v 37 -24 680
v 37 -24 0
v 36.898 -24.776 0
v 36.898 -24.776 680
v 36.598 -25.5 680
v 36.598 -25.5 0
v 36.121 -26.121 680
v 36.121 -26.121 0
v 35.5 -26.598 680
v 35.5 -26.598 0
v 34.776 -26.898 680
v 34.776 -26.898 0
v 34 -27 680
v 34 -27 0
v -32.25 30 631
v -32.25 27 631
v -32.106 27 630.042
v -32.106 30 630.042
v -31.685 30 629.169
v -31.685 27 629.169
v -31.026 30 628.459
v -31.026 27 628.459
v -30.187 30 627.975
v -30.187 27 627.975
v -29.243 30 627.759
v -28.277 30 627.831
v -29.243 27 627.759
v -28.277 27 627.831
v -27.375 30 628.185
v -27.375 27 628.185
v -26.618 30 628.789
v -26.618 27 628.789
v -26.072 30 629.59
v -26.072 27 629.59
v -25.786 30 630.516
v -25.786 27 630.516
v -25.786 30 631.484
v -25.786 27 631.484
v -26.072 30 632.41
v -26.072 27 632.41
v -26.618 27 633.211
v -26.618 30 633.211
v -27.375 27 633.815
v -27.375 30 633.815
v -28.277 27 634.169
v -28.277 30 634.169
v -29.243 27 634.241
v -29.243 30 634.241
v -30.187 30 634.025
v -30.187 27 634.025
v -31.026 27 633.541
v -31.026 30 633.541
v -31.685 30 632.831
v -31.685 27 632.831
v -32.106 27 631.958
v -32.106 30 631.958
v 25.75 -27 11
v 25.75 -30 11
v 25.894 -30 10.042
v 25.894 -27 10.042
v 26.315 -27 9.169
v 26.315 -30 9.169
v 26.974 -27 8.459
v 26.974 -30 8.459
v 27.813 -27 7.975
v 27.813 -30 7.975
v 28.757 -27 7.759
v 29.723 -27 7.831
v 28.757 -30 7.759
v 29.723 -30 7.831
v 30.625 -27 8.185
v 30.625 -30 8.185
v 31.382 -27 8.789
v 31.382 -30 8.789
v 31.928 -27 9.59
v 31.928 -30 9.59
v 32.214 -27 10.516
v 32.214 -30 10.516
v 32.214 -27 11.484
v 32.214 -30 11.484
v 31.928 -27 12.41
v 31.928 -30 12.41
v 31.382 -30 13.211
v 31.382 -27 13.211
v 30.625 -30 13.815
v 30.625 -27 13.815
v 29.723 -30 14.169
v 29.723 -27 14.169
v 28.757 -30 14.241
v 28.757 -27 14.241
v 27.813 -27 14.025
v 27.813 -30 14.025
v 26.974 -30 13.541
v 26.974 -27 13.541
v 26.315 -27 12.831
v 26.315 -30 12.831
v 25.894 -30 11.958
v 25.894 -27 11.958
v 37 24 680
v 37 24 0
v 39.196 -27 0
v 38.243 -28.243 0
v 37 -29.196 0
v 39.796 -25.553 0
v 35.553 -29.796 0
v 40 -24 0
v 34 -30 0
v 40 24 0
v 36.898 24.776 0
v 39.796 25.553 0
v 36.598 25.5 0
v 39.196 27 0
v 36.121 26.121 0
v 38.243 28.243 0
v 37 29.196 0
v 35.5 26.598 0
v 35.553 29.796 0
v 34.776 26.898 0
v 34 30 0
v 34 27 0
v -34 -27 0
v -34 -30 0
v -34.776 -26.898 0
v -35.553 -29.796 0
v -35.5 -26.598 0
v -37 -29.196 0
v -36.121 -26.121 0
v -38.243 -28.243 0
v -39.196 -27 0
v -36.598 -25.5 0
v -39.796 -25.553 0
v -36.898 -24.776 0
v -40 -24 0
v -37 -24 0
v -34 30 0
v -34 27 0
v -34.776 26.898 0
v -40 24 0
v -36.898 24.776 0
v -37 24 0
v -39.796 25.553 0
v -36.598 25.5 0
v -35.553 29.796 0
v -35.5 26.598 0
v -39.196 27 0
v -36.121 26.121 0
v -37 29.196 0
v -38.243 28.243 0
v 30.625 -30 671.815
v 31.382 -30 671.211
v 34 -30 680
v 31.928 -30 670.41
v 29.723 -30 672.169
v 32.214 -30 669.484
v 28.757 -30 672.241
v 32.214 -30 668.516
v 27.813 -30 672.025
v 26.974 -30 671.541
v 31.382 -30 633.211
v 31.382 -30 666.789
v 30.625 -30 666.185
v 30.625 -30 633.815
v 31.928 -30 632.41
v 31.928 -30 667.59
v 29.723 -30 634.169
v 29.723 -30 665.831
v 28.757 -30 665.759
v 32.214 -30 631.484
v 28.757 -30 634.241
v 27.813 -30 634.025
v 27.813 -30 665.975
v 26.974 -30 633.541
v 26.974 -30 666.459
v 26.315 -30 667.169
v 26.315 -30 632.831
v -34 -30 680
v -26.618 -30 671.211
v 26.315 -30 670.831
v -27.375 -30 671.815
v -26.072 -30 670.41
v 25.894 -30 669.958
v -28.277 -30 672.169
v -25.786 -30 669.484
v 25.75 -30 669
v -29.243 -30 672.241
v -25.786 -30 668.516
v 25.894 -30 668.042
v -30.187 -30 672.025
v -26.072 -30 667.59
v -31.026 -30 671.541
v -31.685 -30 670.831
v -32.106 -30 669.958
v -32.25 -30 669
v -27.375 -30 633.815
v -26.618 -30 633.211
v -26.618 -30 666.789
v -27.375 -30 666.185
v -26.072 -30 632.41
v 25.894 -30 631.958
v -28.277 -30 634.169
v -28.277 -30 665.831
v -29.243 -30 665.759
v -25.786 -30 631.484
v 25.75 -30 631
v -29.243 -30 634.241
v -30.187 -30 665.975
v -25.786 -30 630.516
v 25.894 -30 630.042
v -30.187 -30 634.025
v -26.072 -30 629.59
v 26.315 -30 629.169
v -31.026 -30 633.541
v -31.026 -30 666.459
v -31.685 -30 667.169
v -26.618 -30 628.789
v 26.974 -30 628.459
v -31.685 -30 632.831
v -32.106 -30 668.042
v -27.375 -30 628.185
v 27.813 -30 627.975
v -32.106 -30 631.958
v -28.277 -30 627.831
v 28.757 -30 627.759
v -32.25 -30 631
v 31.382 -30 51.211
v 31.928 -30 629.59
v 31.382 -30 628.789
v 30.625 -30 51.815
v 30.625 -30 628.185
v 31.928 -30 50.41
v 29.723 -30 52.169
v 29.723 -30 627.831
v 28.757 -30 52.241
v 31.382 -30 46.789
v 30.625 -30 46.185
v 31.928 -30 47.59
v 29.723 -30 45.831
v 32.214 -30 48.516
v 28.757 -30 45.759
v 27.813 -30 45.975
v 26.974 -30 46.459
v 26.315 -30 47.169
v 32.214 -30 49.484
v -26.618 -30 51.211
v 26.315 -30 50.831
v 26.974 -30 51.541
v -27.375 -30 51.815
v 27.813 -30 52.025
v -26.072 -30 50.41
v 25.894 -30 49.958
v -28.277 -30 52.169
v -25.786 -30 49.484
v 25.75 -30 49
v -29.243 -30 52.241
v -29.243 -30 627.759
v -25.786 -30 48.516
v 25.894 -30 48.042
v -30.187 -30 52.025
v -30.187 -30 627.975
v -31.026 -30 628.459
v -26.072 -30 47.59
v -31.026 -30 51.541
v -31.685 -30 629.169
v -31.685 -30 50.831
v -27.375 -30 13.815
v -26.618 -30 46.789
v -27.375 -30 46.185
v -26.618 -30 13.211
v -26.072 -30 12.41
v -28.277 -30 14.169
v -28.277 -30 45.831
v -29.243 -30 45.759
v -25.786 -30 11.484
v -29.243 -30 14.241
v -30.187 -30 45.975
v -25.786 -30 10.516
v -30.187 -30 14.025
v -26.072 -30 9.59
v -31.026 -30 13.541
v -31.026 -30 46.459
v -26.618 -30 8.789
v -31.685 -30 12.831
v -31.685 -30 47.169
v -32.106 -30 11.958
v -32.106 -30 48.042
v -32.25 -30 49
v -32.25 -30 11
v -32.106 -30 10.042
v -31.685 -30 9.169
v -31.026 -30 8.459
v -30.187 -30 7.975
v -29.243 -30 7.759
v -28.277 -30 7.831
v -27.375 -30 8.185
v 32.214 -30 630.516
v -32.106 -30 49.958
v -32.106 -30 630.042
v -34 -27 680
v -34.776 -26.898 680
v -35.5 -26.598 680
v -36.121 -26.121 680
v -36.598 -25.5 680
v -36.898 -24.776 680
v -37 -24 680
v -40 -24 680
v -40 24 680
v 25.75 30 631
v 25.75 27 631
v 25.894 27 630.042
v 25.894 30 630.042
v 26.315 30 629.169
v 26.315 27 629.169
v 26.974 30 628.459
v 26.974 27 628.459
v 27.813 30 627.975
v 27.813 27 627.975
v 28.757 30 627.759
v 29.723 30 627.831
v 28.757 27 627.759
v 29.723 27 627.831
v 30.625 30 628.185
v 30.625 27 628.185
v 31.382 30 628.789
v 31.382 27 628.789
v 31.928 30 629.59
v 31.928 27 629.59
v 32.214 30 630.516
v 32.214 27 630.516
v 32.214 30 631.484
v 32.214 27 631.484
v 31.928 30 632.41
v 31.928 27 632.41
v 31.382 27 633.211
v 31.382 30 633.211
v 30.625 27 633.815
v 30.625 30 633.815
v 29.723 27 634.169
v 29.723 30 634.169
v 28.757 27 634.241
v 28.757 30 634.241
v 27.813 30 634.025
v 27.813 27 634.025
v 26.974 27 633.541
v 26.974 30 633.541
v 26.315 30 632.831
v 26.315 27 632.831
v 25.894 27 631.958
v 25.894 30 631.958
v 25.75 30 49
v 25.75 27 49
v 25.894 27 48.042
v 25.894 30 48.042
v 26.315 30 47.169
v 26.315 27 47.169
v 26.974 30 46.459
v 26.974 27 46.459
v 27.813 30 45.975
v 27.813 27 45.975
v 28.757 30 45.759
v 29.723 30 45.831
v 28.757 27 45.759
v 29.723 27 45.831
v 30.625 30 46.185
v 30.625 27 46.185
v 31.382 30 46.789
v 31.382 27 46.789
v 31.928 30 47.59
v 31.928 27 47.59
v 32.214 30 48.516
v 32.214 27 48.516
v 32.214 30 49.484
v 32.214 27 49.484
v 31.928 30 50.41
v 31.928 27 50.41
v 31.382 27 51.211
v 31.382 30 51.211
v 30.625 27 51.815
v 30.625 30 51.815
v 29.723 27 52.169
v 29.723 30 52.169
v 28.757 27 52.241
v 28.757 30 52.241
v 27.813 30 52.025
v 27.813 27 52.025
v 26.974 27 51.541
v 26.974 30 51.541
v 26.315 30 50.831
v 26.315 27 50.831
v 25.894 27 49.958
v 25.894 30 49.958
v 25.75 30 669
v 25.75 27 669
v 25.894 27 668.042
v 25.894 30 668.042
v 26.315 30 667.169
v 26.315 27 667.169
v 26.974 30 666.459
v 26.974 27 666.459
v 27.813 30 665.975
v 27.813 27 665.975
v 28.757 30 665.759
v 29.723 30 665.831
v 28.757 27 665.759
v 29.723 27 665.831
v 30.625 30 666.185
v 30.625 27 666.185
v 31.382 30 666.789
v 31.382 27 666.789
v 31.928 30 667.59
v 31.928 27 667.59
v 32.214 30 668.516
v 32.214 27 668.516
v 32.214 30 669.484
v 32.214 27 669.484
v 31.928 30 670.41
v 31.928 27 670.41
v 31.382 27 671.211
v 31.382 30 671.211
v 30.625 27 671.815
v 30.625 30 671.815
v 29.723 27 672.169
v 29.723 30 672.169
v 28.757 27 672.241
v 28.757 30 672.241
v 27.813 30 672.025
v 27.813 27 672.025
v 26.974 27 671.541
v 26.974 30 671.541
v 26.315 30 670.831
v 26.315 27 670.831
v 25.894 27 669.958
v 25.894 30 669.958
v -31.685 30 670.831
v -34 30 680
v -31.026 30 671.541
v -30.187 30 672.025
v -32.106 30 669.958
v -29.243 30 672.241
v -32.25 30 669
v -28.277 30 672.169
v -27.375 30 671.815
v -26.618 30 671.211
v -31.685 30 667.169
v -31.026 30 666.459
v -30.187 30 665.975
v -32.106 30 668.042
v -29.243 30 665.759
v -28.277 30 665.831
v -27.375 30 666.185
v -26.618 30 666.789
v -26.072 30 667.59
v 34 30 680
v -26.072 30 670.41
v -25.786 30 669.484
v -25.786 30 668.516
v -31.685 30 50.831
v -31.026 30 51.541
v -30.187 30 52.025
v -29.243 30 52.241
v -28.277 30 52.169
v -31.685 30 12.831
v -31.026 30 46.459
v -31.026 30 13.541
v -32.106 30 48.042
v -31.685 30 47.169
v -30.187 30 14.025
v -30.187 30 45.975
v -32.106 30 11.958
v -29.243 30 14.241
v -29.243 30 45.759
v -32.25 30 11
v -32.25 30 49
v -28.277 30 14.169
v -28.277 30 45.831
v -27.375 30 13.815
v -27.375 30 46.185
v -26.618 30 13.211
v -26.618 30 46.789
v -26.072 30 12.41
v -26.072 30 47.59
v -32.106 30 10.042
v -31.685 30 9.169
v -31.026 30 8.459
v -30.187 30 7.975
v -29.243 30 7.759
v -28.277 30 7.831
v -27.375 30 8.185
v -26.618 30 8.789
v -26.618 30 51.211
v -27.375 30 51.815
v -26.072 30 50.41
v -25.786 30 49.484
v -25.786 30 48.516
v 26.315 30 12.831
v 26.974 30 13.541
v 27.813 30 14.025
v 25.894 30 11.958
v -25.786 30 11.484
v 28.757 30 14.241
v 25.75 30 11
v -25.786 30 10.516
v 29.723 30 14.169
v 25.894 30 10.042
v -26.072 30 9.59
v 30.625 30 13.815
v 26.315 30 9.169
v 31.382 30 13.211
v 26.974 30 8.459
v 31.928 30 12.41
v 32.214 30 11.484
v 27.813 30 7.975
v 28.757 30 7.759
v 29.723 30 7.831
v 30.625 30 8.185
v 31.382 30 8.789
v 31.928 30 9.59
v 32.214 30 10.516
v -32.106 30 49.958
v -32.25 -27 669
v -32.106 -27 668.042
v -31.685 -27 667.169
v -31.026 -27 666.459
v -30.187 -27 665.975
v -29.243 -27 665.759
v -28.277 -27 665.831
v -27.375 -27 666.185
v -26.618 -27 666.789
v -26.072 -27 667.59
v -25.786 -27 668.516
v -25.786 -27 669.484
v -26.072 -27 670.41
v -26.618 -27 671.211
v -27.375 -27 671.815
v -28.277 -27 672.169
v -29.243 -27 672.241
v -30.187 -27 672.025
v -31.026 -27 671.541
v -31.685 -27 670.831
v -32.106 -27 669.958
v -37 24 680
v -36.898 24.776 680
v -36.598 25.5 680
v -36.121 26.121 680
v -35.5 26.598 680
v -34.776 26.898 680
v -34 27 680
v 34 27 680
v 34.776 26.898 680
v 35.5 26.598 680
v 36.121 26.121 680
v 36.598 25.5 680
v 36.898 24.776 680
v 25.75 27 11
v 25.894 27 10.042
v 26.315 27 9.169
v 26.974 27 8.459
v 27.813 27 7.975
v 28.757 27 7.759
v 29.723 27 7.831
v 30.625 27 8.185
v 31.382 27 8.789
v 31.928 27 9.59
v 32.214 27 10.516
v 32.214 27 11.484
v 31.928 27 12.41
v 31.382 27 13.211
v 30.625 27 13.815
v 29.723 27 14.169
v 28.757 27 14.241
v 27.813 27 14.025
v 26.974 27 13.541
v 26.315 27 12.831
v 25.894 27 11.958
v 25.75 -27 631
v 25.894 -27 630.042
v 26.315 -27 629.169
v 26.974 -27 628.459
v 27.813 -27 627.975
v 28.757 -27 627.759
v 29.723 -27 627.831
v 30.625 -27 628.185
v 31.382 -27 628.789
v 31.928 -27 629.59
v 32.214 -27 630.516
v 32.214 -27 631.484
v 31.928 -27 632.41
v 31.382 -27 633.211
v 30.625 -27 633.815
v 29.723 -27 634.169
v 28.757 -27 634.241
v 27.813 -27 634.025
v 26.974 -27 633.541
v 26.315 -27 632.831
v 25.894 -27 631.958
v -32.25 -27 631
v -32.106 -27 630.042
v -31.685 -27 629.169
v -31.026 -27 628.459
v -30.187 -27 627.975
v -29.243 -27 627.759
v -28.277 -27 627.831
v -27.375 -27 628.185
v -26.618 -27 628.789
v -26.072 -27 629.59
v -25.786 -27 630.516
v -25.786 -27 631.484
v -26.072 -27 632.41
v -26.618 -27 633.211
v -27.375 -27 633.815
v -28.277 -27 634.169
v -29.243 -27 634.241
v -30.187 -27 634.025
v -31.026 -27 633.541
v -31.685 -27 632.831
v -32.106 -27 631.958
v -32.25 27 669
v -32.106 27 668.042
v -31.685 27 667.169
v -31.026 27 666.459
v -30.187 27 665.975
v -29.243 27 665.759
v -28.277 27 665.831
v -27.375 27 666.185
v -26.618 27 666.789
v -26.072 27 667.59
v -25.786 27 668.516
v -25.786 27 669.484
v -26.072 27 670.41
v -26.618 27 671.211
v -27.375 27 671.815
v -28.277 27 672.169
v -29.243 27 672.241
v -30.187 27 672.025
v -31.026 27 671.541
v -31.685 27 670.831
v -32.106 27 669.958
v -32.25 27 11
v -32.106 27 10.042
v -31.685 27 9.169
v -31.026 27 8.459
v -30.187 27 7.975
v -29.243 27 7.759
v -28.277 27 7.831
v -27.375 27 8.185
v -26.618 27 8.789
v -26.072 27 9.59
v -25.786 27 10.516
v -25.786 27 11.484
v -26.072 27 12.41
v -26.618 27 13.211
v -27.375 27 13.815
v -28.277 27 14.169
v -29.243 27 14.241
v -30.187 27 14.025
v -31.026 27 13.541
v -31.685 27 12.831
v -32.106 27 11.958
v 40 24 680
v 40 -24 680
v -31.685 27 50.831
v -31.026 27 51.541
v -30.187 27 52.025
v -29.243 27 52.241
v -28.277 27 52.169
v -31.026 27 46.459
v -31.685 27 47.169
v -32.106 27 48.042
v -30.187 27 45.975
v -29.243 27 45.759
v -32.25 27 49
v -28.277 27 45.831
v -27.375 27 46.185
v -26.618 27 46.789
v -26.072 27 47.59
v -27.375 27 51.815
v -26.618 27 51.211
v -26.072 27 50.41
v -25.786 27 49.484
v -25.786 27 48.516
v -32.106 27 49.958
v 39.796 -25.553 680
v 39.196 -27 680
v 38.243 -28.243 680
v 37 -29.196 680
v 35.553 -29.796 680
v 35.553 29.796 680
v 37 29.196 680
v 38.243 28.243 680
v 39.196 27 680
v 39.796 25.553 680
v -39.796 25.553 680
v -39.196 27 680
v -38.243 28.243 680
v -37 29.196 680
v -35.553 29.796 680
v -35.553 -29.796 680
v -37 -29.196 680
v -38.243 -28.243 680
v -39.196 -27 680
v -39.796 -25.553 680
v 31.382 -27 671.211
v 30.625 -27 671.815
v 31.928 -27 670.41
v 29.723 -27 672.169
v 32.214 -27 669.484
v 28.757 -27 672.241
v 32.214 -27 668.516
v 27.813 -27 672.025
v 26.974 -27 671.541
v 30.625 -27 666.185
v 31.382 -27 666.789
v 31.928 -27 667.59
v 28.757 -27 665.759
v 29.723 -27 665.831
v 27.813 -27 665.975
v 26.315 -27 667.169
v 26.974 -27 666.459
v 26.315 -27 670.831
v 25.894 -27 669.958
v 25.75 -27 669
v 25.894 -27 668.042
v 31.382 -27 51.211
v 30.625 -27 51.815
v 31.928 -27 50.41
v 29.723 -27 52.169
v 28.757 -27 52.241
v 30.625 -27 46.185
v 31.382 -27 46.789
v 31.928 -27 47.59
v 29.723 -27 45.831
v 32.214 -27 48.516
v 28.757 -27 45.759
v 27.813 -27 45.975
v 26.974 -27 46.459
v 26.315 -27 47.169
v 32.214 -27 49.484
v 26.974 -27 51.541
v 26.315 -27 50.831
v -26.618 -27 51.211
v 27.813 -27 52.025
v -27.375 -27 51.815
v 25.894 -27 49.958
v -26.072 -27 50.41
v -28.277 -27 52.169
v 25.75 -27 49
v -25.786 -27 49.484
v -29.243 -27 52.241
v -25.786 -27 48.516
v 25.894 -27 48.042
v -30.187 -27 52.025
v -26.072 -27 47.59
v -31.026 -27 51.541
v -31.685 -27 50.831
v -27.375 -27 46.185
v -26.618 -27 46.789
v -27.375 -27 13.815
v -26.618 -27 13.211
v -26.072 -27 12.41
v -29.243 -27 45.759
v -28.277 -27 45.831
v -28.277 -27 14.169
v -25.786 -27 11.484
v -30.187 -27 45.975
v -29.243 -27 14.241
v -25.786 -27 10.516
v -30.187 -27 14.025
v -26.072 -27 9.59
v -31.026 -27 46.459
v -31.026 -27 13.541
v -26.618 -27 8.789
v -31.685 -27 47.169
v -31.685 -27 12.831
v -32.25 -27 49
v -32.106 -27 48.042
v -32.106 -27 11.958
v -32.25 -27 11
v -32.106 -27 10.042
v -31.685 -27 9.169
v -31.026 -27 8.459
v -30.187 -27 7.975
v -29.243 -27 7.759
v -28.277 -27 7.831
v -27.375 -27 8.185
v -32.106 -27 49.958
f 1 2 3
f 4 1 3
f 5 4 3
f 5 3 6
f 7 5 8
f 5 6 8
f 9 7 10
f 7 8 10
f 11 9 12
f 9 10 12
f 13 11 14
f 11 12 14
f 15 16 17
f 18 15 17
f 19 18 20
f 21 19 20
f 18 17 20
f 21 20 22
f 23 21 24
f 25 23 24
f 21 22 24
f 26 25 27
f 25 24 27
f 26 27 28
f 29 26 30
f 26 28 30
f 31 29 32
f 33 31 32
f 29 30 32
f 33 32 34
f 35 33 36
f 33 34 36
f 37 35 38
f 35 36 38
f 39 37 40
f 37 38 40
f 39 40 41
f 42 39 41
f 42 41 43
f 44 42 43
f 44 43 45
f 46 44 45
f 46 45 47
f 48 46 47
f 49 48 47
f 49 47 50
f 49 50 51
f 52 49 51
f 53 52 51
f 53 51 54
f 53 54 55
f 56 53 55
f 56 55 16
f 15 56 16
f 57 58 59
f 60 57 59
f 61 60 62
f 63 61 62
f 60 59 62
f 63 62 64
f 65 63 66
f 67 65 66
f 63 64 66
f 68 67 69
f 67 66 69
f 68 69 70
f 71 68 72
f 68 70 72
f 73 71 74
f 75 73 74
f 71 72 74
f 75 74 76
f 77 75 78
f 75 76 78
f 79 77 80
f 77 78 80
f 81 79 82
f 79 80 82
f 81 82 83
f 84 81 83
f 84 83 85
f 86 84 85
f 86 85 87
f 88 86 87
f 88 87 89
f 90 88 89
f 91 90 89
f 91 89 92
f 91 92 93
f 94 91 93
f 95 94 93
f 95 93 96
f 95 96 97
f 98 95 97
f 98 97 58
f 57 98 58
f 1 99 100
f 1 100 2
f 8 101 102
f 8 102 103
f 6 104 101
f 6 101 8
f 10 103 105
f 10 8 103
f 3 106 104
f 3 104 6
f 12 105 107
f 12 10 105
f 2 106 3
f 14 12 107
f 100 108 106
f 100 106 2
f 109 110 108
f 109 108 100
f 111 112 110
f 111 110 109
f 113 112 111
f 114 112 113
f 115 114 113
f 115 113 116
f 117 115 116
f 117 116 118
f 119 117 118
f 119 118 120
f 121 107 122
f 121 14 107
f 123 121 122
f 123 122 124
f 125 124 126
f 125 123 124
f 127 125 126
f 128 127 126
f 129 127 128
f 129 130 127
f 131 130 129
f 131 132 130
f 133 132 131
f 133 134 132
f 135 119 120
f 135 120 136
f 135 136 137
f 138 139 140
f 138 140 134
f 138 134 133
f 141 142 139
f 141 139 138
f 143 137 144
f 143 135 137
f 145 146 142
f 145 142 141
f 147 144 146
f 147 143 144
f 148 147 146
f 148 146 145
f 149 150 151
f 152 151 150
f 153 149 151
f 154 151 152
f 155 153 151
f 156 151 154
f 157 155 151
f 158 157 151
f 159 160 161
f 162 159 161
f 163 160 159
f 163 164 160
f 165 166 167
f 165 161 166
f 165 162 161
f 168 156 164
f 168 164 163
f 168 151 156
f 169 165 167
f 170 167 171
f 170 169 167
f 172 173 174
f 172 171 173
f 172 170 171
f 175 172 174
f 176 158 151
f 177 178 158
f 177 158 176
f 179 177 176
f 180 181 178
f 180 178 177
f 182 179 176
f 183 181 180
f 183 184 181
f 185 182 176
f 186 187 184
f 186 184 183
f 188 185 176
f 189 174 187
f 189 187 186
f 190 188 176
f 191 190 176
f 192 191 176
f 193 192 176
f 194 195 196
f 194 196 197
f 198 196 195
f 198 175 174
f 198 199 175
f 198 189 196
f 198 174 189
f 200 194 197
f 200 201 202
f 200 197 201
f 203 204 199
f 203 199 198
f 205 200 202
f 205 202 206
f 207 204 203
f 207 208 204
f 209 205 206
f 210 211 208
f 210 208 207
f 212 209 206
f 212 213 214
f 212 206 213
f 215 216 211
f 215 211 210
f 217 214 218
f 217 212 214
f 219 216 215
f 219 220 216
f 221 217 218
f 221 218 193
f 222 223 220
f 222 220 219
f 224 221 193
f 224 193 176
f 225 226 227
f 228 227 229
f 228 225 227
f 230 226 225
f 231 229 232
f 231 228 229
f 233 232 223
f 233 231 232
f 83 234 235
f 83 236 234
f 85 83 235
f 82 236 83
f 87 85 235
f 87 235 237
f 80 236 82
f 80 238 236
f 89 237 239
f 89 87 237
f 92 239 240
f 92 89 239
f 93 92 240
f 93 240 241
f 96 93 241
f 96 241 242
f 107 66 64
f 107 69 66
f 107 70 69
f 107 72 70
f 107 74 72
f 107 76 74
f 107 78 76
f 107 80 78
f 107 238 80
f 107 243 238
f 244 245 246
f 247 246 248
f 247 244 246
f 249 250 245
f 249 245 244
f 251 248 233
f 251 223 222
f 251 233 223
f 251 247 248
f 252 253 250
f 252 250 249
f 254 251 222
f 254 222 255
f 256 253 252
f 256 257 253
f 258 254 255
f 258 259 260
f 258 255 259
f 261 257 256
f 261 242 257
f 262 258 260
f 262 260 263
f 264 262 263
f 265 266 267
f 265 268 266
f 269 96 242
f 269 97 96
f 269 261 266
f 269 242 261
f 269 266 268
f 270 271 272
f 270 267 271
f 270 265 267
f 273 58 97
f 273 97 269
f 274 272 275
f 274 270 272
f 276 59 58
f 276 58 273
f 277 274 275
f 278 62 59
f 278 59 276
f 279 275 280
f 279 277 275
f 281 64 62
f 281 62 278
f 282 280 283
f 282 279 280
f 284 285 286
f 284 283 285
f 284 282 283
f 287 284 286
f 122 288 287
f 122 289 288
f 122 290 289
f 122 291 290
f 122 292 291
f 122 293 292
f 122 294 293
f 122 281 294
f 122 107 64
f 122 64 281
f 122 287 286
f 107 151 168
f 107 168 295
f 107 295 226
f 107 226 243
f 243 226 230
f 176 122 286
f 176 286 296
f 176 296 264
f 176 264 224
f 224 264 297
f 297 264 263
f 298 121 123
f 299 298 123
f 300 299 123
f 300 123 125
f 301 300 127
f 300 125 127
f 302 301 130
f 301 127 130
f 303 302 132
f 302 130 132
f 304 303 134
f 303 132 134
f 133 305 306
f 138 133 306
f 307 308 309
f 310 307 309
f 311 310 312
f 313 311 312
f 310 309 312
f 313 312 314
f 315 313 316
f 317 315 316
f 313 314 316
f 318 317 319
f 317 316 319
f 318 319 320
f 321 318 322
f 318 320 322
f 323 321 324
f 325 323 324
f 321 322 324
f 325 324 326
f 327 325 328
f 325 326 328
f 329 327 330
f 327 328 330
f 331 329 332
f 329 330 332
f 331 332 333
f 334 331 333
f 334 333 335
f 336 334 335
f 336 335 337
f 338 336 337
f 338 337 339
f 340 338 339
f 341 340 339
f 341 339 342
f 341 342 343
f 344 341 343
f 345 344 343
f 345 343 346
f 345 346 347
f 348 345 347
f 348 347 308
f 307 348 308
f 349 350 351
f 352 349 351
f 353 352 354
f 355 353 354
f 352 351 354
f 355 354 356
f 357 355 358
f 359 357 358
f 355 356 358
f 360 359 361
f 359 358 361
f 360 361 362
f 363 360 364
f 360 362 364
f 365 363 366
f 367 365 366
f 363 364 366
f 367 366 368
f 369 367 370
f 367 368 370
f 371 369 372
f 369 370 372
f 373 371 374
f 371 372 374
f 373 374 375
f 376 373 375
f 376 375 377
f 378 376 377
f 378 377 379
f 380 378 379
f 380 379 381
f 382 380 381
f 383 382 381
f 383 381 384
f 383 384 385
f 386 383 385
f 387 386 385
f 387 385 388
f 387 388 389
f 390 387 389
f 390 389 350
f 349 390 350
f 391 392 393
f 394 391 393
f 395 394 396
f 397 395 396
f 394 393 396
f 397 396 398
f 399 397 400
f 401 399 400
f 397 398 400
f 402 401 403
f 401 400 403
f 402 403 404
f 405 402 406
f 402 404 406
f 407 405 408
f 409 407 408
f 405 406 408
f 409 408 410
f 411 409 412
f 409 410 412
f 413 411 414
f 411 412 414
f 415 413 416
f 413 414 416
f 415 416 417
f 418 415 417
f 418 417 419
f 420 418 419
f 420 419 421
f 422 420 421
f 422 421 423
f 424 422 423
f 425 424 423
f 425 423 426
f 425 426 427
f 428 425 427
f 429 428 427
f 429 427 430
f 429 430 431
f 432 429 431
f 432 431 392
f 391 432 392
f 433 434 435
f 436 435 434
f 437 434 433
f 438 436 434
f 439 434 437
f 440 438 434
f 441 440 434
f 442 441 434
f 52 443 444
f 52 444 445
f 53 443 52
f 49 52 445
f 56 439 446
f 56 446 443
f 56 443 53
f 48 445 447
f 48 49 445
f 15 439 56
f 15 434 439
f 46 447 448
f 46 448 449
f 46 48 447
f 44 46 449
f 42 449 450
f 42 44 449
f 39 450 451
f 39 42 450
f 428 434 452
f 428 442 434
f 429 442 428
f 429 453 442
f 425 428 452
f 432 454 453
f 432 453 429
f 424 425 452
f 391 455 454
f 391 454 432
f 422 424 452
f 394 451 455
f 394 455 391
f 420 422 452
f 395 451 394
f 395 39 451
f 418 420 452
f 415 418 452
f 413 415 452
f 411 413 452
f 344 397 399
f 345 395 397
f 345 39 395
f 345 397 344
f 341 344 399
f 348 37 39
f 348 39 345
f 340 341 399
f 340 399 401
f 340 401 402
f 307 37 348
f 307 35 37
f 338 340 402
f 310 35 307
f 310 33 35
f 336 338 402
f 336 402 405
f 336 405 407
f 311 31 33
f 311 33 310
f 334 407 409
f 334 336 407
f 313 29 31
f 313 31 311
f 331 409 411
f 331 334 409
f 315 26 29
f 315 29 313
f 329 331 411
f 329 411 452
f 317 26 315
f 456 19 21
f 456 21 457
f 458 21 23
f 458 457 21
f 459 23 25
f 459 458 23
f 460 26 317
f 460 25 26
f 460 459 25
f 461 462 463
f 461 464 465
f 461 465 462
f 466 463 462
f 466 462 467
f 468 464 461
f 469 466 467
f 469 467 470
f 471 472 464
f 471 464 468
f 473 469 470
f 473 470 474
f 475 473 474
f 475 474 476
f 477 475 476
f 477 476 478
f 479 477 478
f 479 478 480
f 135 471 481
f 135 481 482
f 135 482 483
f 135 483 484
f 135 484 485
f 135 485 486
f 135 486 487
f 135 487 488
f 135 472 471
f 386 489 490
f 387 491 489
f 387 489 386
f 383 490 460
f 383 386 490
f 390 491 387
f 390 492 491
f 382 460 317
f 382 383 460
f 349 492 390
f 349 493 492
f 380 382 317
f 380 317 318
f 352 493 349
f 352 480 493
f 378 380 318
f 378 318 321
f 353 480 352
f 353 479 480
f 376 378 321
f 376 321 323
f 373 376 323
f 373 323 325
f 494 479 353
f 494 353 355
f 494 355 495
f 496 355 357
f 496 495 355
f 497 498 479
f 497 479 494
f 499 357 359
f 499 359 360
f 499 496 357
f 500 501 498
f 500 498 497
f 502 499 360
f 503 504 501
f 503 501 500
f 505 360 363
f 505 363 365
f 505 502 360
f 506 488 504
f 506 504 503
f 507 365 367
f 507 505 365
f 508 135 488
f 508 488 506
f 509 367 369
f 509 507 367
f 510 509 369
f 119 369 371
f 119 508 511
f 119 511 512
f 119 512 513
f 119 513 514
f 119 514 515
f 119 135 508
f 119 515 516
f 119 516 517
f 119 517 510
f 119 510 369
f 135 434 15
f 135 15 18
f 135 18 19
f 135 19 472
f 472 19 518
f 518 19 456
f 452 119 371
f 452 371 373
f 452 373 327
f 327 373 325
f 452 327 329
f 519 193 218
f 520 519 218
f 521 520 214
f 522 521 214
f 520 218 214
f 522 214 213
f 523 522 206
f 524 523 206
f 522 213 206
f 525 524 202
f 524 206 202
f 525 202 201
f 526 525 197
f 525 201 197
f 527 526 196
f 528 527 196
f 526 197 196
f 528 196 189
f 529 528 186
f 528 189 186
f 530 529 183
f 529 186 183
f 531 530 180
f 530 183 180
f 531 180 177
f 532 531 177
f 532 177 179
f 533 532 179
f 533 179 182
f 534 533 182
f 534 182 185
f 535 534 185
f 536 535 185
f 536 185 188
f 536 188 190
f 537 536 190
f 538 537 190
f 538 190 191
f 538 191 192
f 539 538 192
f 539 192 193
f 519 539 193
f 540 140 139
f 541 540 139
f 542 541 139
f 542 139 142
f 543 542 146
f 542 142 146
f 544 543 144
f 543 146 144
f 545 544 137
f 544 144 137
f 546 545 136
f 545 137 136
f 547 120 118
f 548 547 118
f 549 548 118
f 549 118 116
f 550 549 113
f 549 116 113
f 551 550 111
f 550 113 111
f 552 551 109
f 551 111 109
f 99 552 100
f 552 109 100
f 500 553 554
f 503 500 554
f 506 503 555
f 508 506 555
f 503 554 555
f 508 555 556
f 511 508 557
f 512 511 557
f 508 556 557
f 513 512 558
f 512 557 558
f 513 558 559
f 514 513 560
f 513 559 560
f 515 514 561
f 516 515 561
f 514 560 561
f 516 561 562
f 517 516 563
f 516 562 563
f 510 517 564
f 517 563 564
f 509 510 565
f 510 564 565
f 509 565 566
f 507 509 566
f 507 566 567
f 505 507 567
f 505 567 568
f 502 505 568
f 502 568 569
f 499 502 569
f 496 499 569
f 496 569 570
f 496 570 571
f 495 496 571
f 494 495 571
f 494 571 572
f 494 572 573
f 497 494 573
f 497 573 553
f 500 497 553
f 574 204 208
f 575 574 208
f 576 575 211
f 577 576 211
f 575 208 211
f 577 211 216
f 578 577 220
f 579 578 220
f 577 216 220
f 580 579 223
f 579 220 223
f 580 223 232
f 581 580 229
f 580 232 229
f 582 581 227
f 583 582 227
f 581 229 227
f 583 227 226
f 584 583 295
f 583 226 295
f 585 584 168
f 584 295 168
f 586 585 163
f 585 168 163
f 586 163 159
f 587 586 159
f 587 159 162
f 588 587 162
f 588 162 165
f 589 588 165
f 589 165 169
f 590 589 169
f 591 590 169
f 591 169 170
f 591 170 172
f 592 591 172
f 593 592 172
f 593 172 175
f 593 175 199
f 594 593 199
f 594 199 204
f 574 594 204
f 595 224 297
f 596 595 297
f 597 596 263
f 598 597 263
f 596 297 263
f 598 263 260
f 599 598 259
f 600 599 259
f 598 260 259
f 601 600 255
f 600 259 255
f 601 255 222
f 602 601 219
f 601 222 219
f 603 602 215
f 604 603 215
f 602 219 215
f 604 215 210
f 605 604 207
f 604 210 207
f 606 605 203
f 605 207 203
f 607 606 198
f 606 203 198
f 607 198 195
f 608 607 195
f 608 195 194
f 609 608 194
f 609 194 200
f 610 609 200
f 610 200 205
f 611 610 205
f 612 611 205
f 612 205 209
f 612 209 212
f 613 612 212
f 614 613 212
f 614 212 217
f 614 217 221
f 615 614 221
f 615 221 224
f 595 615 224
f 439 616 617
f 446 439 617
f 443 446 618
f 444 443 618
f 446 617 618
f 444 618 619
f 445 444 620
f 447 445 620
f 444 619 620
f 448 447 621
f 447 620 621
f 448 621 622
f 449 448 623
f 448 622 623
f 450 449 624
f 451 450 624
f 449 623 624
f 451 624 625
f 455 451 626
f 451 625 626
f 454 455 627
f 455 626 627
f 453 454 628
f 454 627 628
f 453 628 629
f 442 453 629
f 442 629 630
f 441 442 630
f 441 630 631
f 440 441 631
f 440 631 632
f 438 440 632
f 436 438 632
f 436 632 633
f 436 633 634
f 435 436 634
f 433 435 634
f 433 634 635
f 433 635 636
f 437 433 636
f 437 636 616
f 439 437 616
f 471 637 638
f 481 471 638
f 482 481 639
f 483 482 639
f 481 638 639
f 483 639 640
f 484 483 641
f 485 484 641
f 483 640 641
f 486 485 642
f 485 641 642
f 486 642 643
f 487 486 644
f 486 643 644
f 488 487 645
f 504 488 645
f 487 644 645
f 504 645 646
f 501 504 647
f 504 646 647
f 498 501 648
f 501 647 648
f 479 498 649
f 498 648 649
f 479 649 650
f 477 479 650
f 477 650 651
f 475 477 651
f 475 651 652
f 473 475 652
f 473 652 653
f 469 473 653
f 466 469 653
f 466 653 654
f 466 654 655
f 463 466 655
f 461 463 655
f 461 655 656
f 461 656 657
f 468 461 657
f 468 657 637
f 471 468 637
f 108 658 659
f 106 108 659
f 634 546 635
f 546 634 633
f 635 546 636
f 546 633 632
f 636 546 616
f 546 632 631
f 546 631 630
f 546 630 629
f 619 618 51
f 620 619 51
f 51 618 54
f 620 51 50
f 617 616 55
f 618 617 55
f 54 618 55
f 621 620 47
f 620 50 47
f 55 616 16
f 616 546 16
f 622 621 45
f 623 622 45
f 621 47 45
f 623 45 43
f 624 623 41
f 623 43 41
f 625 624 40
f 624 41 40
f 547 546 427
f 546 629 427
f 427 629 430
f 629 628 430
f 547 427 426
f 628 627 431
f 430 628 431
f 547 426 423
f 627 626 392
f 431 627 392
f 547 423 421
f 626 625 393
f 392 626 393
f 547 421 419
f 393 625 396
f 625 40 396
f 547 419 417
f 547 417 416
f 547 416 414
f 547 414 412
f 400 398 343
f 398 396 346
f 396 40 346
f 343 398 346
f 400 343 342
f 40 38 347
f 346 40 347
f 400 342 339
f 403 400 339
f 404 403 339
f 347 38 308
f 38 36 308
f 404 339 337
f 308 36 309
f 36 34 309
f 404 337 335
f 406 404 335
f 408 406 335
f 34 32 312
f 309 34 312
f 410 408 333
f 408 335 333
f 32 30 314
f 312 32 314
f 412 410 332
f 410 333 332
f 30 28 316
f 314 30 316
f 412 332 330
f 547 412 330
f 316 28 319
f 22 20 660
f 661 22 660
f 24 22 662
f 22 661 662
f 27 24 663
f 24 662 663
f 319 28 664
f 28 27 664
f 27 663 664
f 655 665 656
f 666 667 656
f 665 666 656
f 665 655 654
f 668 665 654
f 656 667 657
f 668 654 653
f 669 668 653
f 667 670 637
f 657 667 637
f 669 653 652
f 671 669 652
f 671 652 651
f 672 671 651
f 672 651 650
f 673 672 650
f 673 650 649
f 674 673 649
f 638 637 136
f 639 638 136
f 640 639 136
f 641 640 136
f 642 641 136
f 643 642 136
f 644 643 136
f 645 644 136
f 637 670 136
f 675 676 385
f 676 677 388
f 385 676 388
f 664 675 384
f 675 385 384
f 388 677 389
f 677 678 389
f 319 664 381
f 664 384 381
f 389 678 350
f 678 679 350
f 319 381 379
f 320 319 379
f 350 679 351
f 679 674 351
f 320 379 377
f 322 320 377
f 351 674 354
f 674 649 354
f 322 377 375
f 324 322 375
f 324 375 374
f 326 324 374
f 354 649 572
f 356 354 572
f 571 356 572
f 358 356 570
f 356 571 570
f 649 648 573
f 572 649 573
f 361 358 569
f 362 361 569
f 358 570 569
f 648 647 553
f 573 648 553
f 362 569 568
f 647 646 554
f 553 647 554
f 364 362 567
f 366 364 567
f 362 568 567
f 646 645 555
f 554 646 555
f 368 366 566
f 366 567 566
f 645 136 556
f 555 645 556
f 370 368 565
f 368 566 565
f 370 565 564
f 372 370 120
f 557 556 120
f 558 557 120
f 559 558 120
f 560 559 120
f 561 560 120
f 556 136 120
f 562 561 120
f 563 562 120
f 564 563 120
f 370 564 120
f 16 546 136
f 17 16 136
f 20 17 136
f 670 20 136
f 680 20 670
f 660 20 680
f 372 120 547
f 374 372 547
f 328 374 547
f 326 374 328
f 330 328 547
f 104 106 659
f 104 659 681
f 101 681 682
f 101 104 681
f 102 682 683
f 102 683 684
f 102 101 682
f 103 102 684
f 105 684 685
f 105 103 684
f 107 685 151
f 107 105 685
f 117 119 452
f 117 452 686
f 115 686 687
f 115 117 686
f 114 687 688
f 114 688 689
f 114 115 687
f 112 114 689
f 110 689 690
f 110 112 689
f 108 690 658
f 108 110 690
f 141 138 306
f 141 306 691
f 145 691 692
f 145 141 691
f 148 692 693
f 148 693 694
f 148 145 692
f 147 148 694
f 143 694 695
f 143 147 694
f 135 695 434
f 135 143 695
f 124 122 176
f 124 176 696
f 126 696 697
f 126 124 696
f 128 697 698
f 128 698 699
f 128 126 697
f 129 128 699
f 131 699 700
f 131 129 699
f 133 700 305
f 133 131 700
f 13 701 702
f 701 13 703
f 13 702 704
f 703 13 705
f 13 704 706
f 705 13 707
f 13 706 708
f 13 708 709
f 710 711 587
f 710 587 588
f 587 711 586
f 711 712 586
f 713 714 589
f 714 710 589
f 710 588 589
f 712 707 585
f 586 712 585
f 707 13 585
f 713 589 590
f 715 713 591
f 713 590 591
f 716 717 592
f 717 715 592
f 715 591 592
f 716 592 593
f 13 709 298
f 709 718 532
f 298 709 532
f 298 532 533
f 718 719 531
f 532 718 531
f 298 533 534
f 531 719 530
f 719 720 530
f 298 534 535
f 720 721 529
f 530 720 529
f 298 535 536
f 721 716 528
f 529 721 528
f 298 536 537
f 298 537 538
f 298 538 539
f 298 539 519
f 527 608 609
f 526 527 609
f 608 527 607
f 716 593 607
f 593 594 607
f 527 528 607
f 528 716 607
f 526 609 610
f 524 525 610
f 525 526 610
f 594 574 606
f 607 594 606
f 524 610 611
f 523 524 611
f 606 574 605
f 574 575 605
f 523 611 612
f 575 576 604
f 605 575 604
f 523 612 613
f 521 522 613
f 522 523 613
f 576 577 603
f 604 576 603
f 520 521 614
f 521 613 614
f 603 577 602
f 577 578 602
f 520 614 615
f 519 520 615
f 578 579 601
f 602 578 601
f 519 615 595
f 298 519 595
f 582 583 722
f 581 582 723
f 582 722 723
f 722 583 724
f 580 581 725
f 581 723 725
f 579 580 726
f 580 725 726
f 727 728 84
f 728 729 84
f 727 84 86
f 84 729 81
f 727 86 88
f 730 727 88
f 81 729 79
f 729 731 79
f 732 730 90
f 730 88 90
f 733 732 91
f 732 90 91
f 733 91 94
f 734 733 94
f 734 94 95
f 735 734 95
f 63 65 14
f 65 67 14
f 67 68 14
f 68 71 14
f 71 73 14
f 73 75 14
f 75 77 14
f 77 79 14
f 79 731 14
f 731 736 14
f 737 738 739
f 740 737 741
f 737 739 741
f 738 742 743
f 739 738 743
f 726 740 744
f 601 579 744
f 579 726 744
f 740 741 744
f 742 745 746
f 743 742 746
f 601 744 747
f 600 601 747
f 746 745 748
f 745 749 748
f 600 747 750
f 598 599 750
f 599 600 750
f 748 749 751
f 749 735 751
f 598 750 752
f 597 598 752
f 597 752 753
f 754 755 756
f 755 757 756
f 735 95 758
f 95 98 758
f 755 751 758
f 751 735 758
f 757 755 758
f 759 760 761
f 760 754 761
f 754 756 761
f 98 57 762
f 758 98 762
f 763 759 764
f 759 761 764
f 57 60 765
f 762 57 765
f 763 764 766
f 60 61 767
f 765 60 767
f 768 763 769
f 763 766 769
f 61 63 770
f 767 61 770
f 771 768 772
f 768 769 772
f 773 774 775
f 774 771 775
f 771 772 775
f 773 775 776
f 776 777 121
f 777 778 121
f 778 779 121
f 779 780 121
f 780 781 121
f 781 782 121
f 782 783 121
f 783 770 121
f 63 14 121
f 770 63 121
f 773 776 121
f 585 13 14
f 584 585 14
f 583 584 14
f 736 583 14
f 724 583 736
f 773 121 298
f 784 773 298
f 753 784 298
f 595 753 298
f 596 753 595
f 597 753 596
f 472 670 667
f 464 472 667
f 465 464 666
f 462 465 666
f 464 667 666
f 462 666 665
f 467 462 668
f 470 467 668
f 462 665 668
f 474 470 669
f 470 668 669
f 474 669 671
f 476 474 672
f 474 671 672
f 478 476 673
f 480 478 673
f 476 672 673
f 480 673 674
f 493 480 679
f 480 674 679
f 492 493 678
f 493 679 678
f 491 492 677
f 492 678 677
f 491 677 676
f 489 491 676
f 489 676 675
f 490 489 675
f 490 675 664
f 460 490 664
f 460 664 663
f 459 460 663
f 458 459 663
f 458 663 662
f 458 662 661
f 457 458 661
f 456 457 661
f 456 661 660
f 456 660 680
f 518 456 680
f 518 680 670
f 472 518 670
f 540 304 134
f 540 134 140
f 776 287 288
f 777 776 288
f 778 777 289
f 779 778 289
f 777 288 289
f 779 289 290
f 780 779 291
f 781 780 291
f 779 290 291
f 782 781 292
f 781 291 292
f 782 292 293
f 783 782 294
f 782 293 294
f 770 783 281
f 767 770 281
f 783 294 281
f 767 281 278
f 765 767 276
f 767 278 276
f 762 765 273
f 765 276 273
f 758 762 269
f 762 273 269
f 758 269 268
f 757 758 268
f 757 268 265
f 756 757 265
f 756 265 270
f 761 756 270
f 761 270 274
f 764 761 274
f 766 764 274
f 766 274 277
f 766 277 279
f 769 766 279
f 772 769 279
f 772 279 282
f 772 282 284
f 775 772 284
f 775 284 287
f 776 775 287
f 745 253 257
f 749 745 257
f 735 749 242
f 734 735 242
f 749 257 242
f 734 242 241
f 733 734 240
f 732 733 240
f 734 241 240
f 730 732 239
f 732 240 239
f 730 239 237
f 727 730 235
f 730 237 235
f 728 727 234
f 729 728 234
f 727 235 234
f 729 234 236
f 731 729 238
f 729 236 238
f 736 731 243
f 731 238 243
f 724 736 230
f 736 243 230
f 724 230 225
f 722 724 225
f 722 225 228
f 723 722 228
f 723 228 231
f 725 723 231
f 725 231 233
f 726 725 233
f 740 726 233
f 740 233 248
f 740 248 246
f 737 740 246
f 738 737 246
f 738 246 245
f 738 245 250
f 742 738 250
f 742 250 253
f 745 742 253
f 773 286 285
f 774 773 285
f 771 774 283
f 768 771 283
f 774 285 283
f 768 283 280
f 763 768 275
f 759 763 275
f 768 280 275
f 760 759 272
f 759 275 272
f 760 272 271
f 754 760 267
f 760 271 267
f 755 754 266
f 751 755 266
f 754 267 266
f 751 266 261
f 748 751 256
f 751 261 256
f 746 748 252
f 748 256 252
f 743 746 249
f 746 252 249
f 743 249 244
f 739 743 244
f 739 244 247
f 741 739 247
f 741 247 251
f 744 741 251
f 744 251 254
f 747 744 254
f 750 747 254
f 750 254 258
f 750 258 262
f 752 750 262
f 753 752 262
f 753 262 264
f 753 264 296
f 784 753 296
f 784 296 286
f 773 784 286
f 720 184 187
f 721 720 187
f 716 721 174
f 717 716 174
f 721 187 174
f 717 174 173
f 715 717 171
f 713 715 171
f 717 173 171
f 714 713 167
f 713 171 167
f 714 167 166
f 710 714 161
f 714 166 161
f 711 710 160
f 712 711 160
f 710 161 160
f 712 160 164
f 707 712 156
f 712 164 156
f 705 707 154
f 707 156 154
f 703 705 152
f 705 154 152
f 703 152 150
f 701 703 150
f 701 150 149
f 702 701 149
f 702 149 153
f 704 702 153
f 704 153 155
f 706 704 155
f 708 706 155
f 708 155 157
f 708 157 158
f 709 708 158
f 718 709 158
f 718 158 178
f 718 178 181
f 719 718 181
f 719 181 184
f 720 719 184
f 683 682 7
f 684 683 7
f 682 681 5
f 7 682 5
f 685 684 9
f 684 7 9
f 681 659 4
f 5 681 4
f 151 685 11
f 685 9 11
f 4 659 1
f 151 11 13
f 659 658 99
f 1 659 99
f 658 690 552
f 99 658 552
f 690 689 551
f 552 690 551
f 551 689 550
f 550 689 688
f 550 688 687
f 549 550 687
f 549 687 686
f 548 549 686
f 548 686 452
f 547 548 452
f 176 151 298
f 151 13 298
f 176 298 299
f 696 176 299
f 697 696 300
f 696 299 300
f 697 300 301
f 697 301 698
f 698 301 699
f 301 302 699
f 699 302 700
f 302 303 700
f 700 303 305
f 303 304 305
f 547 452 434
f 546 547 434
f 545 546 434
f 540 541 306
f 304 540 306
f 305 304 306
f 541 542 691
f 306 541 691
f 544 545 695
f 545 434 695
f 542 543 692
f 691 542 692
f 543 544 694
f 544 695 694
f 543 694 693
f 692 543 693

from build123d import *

# Parameters (mm, degrees)
BOSS_EXTRUDE1_DEPTH = 680
HOLE1_D             = 6.5


with BuildPart() as part:
    # Sketch1 → Boss-Extrude1 (new body)
    with BuildSketch(Plane.XY):
        with BuildLine():
            Line((-40, -24), (-40, 24))
            ThreePointArc((-40, 24), (-38.242640687, 28.242640687), (-34, 30))
            Line((-34, 30), (34, 30))
            ThreePointArc((34, 30), (38.242640687, 28.242640687), (40, 24))
            Line((40, 24), (40, -24))
            ThreePointArc((40, -24), (38.242640687, -28.242640687), (34, -30))
            Line((34, -30), (-34, -30))
            ThreePointArc((-34, -30), (-38.242640687, -28.242640687), (-40, -24))
        make_face()
        with BuildLine():
            Line((-34, 27), (34, 27))
            ThreePointArc((34, 27), (36.121320344, 26.121320344), (37, 24))
            Line((37, 24), (37, -24))
            ThreePointArc((37, -24), (36.121320344, -26.121320344), (34, -27))
            Line((34, -27), (-34, -27))
            ThreePointArc((-34, -27), (-36.121320344, -26.121320344), (-37, -24))
            Line((-37, -24), (-37, 24))
            ThreePointArc((-37, 24), (-36.121320344, 26.121320344), (-34, 27))
        make_face(mode=Mode.SUBTRACT)
    extrude(amount=BOSS_EXTRUDE1_DEPTH)

    # Hole1 (through all)
    with Locations(Plane(origin=(-29, 30, 669), x_dir=(1, 0, 0), z_dir=(0, 1, 0))):
        with Locations((0, 0), (0, 38), (58, 38), (58, 0), (0, 658), (0, 620), (58, 658), (58, 620)):
            Hole(HOLE1_D / 2)


solid = part.part
